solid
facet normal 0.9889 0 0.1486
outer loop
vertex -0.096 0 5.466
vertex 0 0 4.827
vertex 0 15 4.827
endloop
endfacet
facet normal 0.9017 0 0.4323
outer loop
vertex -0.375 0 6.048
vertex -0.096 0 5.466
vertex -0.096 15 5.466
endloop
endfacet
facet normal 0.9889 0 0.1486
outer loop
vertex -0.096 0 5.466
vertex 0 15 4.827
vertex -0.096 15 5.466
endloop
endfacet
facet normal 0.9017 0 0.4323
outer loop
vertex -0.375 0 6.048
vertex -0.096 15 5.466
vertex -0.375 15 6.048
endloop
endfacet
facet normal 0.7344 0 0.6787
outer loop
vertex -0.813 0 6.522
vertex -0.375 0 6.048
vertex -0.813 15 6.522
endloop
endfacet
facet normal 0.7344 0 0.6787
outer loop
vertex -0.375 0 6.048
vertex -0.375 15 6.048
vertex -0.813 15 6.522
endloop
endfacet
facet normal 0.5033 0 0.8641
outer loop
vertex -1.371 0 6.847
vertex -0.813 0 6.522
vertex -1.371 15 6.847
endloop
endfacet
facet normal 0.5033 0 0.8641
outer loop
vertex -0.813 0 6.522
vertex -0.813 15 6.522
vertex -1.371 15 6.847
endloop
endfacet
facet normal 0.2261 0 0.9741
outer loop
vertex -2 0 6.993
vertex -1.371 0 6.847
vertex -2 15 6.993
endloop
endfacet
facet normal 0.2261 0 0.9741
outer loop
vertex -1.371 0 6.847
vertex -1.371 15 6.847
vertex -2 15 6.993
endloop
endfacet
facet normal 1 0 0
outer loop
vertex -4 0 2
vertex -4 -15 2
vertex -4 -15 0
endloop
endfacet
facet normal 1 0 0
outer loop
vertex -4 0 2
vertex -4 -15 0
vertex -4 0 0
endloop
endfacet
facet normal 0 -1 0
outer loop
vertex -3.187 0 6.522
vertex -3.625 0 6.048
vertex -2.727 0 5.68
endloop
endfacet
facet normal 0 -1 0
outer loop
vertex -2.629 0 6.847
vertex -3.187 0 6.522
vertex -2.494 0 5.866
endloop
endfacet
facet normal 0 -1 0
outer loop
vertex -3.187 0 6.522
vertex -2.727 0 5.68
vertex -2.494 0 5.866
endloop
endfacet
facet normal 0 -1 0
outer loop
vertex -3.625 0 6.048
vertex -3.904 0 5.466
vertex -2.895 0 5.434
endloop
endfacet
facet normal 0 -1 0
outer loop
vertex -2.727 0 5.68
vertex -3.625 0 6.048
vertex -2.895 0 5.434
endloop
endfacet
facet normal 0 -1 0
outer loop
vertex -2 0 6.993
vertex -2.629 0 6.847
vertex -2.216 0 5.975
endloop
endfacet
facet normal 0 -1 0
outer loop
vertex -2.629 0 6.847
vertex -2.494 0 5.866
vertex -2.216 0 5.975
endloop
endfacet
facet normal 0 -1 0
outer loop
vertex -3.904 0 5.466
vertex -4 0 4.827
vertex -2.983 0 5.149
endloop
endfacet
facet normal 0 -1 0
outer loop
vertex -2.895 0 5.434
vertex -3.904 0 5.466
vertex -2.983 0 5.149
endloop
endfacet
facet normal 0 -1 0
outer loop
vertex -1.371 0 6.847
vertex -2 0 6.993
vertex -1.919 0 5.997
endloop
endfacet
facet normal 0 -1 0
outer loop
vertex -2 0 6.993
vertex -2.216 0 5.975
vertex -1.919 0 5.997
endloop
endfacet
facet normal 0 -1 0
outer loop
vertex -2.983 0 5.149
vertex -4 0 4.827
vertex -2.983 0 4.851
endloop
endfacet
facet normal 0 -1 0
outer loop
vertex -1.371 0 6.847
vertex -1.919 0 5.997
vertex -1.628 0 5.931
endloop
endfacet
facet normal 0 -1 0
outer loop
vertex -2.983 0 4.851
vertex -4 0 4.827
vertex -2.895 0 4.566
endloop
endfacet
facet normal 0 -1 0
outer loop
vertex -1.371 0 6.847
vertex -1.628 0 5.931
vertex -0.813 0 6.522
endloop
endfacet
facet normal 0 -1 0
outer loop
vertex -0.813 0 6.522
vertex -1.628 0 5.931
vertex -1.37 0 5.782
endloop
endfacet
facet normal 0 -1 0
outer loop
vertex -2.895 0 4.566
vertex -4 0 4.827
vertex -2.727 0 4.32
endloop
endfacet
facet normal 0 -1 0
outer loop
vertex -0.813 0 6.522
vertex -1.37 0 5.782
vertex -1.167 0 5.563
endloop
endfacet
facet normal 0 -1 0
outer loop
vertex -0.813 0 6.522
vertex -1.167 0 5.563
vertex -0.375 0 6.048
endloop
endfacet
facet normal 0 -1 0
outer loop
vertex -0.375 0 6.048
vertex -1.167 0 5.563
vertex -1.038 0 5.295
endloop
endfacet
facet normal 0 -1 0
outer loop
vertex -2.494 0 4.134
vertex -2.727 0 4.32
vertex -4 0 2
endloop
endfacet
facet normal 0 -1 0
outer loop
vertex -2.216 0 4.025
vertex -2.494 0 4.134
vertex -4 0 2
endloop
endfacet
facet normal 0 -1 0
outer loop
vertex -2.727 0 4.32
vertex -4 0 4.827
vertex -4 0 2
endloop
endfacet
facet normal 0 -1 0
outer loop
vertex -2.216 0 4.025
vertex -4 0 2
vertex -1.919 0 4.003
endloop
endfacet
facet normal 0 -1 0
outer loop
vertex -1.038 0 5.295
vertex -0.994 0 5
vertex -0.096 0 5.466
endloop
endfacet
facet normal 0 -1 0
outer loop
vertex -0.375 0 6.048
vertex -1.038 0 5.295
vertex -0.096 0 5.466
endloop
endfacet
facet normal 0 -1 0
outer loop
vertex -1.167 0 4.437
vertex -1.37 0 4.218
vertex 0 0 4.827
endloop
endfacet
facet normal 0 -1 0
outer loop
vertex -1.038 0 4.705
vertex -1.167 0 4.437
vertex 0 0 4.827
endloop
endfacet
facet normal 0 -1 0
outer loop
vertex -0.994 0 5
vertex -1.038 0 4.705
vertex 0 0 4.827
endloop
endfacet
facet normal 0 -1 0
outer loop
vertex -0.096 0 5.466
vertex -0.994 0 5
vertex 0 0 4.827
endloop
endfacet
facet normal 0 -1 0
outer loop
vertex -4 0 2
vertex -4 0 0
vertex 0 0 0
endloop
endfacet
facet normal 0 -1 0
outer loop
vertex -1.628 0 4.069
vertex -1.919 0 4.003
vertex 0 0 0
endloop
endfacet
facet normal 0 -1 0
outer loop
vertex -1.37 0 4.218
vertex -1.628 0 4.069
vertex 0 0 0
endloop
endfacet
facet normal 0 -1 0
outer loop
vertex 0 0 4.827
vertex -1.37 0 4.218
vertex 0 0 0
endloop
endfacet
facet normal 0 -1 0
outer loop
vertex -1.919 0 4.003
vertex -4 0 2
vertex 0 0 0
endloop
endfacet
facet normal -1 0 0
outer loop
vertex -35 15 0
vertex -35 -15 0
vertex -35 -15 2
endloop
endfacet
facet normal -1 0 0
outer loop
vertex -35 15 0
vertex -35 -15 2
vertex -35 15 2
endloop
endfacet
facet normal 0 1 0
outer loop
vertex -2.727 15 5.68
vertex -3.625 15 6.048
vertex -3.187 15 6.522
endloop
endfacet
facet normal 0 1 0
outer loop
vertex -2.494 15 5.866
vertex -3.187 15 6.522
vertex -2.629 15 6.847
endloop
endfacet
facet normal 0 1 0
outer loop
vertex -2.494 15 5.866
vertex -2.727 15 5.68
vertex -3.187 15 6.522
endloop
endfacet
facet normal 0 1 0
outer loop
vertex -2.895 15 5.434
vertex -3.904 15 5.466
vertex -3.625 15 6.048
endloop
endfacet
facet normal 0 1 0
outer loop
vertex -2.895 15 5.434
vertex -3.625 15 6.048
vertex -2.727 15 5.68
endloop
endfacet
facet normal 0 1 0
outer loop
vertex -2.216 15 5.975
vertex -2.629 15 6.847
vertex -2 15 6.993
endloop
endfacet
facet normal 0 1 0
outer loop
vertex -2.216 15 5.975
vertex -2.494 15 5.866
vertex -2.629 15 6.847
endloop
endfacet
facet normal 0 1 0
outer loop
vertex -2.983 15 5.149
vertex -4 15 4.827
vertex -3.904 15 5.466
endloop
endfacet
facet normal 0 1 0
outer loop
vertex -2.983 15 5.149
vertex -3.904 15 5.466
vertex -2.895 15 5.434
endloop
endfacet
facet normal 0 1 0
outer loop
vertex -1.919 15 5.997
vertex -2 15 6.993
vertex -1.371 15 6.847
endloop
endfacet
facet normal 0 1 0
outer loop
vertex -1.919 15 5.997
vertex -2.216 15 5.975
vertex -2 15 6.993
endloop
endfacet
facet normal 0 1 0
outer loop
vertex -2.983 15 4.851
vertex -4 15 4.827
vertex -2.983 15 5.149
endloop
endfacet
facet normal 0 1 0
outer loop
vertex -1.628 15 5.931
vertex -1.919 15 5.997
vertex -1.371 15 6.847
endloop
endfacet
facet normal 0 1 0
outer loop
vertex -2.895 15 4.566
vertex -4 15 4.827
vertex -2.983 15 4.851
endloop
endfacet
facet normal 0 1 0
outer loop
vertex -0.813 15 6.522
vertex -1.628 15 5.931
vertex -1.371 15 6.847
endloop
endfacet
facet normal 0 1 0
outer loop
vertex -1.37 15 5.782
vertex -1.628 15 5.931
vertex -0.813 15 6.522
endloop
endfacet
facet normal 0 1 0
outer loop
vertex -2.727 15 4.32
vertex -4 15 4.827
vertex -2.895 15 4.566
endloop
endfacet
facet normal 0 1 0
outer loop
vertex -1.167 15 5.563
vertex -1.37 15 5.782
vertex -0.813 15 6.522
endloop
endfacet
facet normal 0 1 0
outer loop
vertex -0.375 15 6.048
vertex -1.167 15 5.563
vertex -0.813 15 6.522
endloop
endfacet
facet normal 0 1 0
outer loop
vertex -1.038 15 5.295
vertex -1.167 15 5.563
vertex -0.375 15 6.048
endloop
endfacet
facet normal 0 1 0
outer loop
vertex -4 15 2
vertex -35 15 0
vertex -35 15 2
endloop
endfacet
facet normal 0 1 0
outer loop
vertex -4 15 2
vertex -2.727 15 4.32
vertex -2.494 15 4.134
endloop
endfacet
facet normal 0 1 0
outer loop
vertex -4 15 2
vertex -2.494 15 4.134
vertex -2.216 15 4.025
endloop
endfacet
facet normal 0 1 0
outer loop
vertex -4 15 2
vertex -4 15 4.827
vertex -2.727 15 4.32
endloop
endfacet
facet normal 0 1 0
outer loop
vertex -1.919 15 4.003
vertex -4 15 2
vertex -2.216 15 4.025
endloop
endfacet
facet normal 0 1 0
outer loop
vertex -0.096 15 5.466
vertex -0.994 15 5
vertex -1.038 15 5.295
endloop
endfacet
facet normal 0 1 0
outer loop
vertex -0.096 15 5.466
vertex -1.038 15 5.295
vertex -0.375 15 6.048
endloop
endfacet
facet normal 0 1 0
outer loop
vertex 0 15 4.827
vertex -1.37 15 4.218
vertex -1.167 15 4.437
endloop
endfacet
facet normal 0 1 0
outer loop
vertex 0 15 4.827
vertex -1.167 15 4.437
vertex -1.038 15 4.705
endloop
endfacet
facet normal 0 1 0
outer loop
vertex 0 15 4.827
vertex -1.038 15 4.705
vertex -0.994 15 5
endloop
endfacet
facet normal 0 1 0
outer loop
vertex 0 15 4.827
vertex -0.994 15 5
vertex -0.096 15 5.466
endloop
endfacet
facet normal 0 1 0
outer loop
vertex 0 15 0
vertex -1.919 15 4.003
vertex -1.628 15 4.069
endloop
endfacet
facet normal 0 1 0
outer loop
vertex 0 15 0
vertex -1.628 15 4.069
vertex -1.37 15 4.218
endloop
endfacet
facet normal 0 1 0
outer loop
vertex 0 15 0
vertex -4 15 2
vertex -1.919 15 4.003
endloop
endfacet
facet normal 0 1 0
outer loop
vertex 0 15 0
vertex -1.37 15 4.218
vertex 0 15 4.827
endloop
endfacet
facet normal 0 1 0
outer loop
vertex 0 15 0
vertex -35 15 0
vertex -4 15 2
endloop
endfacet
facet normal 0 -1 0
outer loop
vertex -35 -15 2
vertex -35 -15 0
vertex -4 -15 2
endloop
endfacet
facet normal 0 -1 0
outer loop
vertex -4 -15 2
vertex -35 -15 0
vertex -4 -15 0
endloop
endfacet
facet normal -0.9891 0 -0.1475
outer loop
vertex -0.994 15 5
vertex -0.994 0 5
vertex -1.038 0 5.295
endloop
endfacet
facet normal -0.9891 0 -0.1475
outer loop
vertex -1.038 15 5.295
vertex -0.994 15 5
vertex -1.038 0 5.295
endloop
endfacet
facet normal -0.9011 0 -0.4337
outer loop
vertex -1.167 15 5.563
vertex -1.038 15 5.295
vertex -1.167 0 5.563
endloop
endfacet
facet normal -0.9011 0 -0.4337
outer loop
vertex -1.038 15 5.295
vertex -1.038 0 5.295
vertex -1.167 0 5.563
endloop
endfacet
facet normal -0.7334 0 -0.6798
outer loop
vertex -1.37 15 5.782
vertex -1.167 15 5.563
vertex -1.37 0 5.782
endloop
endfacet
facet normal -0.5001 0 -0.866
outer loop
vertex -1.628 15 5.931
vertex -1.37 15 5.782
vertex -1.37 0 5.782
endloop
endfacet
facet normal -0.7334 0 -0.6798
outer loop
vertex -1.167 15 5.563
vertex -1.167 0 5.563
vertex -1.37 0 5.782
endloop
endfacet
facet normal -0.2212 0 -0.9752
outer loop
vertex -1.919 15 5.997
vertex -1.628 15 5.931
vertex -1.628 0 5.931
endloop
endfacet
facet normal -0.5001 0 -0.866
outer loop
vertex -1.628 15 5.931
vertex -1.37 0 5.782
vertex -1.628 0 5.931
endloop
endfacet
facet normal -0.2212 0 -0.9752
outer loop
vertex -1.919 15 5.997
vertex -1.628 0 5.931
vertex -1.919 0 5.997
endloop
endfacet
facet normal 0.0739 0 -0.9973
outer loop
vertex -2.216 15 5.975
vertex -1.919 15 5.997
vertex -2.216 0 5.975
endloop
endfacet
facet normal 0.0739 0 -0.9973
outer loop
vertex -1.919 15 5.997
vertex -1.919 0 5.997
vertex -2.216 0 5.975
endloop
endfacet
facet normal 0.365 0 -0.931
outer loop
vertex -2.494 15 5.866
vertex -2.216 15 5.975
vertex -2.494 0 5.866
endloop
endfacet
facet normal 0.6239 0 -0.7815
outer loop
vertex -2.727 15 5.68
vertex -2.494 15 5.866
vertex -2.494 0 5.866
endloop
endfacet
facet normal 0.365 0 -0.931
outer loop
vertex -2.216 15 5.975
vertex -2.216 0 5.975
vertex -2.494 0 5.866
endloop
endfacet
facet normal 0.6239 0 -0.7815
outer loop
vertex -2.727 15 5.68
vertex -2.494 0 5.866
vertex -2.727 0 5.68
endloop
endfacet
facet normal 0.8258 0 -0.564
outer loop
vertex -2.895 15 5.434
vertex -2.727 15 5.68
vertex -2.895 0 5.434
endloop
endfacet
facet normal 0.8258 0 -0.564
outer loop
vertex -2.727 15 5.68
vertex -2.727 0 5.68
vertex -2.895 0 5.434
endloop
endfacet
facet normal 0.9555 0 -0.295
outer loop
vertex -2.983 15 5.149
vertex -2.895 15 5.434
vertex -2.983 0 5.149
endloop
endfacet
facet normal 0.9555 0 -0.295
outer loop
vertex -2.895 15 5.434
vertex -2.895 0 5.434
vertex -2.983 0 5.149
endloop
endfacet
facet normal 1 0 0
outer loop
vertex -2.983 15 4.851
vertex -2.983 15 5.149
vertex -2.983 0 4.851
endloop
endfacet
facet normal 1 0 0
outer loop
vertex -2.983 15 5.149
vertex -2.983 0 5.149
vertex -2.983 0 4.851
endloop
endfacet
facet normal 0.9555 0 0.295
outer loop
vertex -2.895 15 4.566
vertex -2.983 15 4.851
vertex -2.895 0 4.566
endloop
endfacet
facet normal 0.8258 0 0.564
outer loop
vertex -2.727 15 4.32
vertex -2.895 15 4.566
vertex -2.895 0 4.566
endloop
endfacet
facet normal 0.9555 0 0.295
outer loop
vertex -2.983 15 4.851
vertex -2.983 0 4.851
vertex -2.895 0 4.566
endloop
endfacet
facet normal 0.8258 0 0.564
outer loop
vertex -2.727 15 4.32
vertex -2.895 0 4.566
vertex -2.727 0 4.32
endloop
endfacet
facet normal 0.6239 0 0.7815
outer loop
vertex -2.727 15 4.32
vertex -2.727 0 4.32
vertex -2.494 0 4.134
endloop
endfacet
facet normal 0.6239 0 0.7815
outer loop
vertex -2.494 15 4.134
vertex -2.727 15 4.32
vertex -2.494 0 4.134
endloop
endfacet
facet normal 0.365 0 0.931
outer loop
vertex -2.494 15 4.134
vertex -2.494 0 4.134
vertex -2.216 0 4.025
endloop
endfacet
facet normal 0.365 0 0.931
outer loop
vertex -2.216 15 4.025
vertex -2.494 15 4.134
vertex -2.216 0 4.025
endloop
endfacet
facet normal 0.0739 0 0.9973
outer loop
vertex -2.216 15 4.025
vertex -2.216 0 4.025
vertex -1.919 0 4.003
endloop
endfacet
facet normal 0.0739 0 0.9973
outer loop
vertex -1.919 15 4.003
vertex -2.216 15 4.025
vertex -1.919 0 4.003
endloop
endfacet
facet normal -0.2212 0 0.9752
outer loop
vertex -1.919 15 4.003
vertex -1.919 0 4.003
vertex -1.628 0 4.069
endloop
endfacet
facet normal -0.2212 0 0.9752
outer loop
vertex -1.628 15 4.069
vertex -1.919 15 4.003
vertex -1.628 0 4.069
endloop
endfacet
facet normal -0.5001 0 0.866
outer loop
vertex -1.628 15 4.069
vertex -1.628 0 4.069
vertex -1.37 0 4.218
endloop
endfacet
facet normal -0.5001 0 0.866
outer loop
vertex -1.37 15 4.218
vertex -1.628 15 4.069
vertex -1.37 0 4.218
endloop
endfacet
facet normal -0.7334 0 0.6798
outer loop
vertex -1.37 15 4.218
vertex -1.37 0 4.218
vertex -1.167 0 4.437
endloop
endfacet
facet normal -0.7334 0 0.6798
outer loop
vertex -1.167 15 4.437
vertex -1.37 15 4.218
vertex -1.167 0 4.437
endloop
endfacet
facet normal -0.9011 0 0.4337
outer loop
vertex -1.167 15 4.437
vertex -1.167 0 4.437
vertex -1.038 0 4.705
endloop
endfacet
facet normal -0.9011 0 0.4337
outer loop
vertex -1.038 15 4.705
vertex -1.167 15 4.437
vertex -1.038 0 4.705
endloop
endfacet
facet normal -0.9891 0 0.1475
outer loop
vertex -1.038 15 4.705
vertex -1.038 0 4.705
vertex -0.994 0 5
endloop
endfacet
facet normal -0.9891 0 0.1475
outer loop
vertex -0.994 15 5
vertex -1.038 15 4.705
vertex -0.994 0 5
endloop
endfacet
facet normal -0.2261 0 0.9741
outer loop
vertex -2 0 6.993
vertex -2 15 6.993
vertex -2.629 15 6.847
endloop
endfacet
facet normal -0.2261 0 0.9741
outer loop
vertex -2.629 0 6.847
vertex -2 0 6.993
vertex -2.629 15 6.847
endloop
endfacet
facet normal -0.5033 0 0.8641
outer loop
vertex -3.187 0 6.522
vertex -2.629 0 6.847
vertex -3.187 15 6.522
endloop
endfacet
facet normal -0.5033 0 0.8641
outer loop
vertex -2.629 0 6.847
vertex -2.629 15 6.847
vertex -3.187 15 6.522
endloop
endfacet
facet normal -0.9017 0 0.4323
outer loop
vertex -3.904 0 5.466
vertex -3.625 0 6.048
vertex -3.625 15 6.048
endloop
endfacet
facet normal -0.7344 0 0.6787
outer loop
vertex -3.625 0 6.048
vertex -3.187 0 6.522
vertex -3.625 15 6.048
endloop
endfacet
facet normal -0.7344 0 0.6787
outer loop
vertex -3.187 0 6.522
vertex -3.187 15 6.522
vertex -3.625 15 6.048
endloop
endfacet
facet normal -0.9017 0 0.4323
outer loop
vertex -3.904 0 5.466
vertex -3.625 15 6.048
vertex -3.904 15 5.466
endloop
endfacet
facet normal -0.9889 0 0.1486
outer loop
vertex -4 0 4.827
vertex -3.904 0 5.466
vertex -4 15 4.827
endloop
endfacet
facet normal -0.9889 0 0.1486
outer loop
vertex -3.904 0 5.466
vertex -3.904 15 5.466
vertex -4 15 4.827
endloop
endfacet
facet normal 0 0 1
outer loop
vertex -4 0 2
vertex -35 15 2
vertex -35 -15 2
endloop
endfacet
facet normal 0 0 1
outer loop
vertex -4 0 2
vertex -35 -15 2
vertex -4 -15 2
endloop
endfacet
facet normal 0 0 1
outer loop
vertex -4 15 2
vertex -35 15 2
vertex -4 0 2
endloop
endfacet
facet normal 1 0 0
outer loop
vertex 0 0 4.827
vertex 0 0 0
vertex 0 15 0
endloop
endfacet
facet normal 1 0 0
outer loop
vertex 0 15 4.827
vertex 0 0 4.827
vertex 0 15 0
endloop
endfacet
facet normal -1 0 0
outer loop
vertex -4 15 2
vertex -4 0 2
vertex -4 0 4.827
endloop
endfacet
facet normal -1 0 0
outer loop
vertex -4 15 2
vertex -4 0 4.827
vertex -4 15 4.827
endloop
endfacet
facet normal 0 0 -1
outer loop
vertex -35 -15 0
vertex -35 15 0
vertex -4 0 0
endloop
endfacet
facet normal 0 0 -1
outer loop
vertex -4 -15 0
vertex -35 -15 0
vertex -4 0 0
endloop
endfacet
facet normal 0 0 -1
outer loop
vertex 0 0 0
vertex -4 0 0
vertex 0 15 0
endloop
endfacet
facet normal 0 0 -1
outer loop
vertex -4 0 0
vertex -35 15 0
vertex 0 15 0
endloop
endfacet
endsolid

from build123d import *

# Parameters (mm, degrees)
F0_W        = 35
F0_H        = 30
F1_DEPTH    = 2
F2_W        = 4
F2_H        = 15
F3_DEPTH    = 5
F4_R        = 1
F5_DEPTH    = 25
F6_T1_DEPTH = 25.8639610307
F7_W        = 4
F7_H        = 15
F8_DEPTH    = 25


# Not quite as in the source:
# - a fillet or chamfer that OpenCascade refuses, or shapes differently, is made with other operations: its cross-section is extruded or revolved along the edge and cut away or added


with BuildPart() as f1:
    # F0 (on Top) → F1 (new body)
    with BuildSketch(Plane.XY):
        with Locations((-17.5, 0)):
            Rectangle(F0_W, F0_H)
    extrude(amount=F1_DEPTH)

    # F2 (on face) → F3 (join)
    with BuildSketch(Plane.XY.offset(2)):
        with Locations((-2, 7.5)):
            Rectangle(F2_W, F2_H)
    extrude(amount=F3_DEPTH)

    # F4 (on face) → F5 (cut)
    with BuildSketch(Plane.XZ):
        with Locations((-1.9937221408, 4.9999934314)):
            Circle(F4_R)
    extrude(amount=-F5_DEPTH, mode=Mode.SUBTRACT)

    # F6: fillet of radius 2.1727922061 on 2 edges, made by hand

    # F6_s2 → F6_t1 (cut)
    with BuildSketch(Plane.XZ.offset(-20.4319805153)):
        with BuildLine():
            ThreePointArc((-1.8272077939, 7), (-3.3636038969, 6.3636038969), (-4, 4.8272077939))
            Line((-4, 4.8272077939), (-4, 7))
            Line((-4, 7), (-1.8272077939, 7))
        make_face()
        with BuildLine():
            ThreePointArc((0, 4.8272077939), (-0.6363961031, 6.3636038969), (-2.1727922061, 7))
            Line((-2.1727922061, 7), (0, 7))
            Line((0, 7), (0, 4.8272077939))
        make_face()
    extrude(amount=F6_T1_DEPTH, mode=Mode.SUBTRACT)

    # F7 (on face) → F8 (cut)
    with BuildSketch(Plane.XY.offset(2)):
        with Locations((-2, -7.5)):
            Rectangle(F7_W, F7_H)
    extrude(amount=-F8_DEPTH, mode=Mode.SUBTRACT)


solid = f1.part
